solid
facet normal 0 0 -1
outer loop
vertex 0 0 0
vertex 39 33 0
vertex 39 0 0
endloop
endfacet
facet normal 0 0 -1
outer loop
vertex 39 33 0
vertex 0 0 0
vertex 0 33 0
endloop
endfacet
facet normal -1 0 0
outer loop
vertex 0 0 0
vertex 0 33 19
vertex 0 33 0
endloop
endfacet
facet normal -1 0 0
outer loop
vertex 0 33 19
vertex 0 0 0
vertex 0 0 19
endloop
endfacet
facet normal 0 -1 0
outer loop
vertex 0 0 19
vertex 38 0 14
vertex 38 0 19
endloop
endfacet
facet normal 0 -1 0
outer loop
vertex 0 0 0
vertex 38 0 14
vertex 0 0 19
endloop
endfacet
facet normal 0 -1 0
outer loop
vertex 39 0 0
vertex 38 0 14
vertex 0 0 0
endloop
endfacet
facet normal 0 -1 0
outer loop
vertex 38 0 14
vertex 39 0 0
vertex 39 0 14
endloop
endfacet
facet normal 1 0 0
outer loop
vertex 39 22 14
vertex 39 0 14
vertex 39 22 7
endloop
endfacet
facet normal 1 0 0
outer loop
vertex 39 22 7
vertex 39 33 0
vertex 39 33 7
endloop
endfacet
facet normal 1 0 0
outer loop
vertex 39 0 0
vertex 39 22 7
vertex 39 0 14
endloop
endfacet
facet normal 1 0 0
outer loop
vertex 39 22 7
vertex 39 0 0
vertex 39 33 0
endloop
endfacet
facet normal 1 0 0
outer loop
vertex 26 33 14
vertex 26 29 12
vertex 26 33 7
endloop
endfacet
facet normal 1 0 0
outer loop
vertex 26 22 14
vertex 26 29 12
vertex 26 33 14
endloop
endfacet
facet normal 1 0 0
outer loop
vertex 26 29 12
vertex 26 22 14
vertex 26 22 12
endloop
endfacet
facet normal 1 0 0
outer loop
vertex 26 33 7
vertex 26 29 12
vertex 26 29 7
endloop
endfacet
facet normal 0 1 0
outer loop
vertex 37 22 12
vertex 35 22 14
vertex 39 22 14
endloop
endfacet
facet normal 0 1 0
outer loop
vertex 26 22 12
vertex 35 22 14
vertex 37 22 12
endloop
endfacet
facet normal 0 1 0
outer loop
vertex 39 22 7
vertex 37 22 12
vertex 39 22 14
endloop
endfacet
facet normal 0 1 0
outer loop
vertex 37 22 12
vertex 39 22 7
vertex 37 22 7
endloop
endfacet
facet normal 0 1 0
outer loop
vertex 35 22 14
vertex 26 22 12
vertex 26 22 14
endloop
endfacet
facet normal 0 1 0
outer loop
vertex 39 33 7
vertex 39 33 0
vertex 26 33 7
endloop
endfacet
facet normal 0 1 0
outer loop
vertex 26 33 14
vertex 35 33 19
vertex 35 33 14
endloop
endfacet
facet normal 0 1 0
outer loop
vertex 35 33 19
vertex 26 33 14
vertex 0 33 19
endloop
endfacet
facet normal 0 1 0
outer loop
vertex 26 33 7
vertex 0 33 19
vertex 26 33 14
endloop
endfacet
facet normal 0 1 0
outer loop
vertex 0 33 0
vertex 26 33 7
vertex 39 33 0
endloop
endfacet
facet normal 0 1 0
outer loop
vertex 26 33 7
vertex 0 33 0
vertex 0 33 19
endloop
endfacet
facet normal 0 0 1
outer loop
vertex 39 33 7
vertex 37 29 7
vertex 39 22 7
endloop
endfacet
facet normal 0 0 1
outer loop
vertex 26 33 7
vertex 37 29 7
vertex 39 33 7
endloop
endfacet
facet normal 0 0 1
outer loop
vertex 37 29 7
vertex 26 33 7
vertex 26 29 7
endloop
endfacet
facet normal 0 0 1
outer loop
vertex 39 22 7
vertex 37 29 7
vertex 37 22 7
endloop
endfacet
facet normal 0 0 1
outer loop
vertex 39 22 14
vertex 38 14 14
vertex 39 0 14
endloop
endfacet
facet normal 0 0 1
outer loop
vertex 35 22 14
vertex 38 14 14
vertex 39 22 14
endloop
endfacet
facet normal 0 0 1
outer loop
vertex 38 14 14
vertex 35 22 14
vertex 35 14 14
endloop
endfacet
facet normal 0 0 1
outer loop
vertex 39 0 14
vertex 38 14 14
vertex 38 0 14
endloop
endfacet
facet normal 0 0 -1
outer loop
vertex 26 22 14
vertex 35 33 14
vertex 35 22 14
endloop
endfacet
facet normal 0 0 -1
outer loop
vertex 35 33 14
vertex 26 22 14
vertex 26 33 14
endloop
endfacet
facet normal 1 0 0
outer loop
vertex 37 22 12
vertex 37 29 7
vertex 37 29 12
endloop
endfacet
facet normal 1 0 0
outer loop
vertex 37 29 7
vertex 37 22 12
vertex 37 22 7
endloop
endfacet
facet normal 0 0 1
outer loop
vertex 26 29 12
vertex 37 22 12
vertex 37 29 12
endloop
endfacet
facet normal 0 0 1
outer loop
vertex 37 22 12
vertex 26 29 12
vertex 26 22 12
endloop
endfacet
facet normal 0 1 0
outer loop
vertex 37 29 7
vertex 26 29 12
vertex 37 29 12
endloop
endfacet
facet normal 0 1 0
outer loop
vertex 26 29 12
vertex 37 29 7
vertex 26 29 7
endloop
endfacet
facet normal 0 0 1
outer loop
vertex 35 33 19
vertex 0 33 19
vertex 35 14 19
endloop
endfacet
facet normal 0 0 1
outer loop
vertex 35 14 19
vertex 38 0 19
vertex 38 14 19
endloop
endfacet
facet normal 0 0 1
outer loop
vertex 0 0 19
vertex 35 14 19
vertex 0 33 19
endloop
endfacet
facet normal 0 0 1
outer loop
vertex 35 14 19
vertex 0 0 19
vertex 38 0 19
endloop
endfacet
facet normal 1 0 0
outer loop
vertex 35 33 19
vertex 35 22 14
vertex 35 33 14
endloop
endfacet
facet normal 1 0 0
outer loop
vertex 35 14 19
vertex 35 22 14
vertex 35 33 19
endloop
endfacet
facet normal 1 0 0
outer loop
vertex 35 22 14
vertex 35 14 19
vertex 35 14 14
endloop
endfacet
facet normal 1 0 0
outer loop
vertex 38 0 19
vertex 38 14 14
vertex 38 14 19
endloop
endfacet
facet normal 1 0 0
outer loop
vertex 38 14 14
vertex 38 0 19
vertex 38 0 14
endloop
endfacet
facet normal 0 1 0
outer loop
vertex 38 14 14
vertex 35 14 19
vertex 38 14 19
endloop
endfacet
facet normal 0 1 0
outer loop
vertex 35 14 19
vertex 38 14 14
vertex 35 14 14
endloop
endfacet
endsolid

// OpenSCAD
translate([6.5, 5.5, 3.5]) color([0.051152415727703016, 0.2730496953424699, 0.9956802504828091]) cube([13, 11, 7], center=true);
translate([19.5, 5.5, 3.5]) color([0.25391998649183944, 0.6803935586065328, 0.7027090324157298]) cube([13, 11, 7], center=true);
translate([32.5, 5.5, 3.5]) color([0.9291230685247301, 0.9949404722907454, 0.7620813713006523]) cube([13, 11, 7], center=true);
translate([6.5, 16.5, 3.5]) color([0.7625973189567923, 0.5162610213479427, 0.3860717563215982]) cube([13, 11, 7], center=true);
translate([19.5, 16.5, 3.5]) color([0.8343975914408754, 0.2506337702942619, 0.11599539642064438]) cube([13, 11, 7], center=true);
translate([32.5, 16.5, 3.5]) color([0.9817240858781537, 0.8047994372884794, 0.9431012043694105]) cube([13, 11, 7], center=true);
translate([6.5, 27.5, 3.5]) color([0.24264659424234813, 0.6738638931519124, 0.5327800265053269]) cube([13, 11, 7], center=true);
translate([19.5, 27.5, 3.5]) color([0.8756440829735669, 0.16255101499230828, 0.8680483691353614]) cube([13, 11, 7], center=true);
translate([32.5, 27.5, 3.5]) color([0.15305579700066485, 0.8462165202751376, 0.8200801239095041]) cube([13, 11, 7], center=true);
translate([6.5, 5.5, 10.5]) color([0.5849326984313064, 0.05125489506773162, 0.156166769208809]) cube([13, 11, 7], center=true);
translate([19.5, 5.5, 10.5]) color([0.34458118202681143, 0.291190613997825, 0.29342424365134856]) cube([13, 11, 7], center=true);
translate([32.5, 5.5, 10.5]) color([0.49485912757206985, 0.40365829021262367, 0.43100562682353716]) cube([13, 11, 7], center=true);
translate([6.5, 16.5, 10.5]) color([0.17003546655932655, 0.788340085303476, 0.5686027559906347]) cube([13, 11, 7], center=true);
translate([19.5, 16.5, 10.5]) color([0.44188886974638586, 0.3413461590512491, 0.009317740415098474]) cube([13, 11, 7], center=true);
translate([32.5, 16.5, 10.5]) color([0.72162474304745, 0.9099060293040379, 0.6642090292154819]) cube([13, 11, 7], center=true);
translate([6.5, 27.5, 10.5]) color([0.6628365798191557, 0.2575988974219705, 0.6122127561841502]) cube([13, 11, 7], center=true);
translate([19.5, 27.5, 10.5]) color([0.07024606726227145, 0.936077955543095, 0.27870721332570936]) cube([13, 11, 7], center=true);
translate([31.5, 25.5, 9.5]) color([0.8301443917589898, 0.5295296249528143, 0.06328696503387199]) cube([11, 7, 5], center=true);
translate([3.5, 5.5, 16.5]) color([0.639390097241117, 0.579686955437464, 0.9416538141960143]) cube([7, 11, 5], center=true);
translate([10.5, 5.5, 16.5]) color([0.6321291610349786, 0.5434228748459046, 0.38469874676133664]) cube([7, 11, 5], center=true);
translate([17.5, 5.5, 16.5]) color([0.434637548519362, 0.31139777068021024, 0.01363511702942577]) cube([7, 11, 5], center=true);
translate([24.5, 5.5, 16.5]) color([0.7785312160167684, 0.8197509625398982, 0.28044077713976767]) cube([7, 11, 5], center=true);
translate([3.5, 16.5, 16.5]) color([0.2581907625337724, 0.5272652548146236, 0.3179301097250754]) cube([7, 11, 5], center=true);
translate([10.5, 16.5, 16.5]) color([0.3422638341038545, 0.7055726929201963, 0.43169639849300545]) cube([7, 11, 5], center=true);
translate([17.5, 16.5, 16.5]) color([0.14170724037842175, 0.0059275683019511805, 0.5113413643489257]) cube([7, 11, 5], center=true);
translate([24.5, 16.5, 16.5]) color([0.7846494738841625, 0.7013909140505133, 0.7815279332048084]) cube([7, 11, 5], center=true);
translate([3.5, 27.5, 16.5]) color([0.38414456219182536, 0.4641305725985776, 0.036369164001931575]) cube([7, 11, 5], center=true);
translate([10.5, 27.5, 16.5]) color([0.9124290899309246, 0.6366653413633517, 0.798477007479407]) cube([7, 11, 5], center=true);
translate([17.5, 27.5, 16.5]) color([0.7602358551941967, 0.899814300356001, 0.3622224295816935]) cube([7, 11, 5], center=true);
translate([24.5, 27.5, 16.5]) color([0.9815510059994267, 0.15851660579635174, 0.19450942151924966]) cube([7, 11, 5], center=true);
translate([31.5, 1.5, 16.5]) color([0.35447317829590397, 0.700089123077614, 0.019141470871264166]) cube([7, 3, 5], center=true);
translate([31.5, 4.5, 16.5]) color([0.7352582011311831, 0.5715587801616956, 0.24207966979200135]) cube([7, 3, 5], center=true);
translate([31.5, 7.5, 16.5]) color([0.18514161515939986, 0.7580746928341441, 0.4199819570625165]) cube([7, 3, 5], center=true);
translate([31.5, 10.5, 16.5]) color([0.5731405723704375, 0.23673356878784502, 0.7138158488992904]) cube([7, 3, 5], center=true);
translate([31.5, 13.5, 16.5]) color([0.8637627475626694, 0.8949592620642776, 0.8103115760161889]) cube([7, 3, 5], center=true);
translate([31.5, 16.5, 16.5]) color([0.1004216369837837, 0.18827941391234093, 0.44049583318501173]) cube([7, 3, 5], center=true);
translate([31.5, 19.5, 16.5]) color([0.06522983258952386, 0.42674703623912436, 0.3947422574489625]) cube([7, 3, 5], center=true);
translate([31.5, 22.5, 16.5]) color([0.27185274848852736, 0.43721657158275895, 0.7577296702077931]) cube([7, 3, 5], center=true);
translate([31.5, 25.5, 16.5]) color([0.3561631337530091, 0.3277620307403001, 0.30701912216942273]) cube([7, 3, 5], center=true);
translate([31.5, 28.5, 16.5]) color([0.492518074892234, 0.7625268269371841, 0.2027877178963453]) cube([7, 3, 5], center=true);
translate([31.5, 31.5, 16.5]) color([0.39789846082497404, 0.4356119392473006, 0.6353731723550147]) cube([7, 3, 5], center=true);
translate([36.5, 1.0, 16.5]) color([0.673076446274384, 0.6970991483341651, 0.8225488218547198]) cube([3, 2, 5], center=true);
translate([36.5, 3.0, 16.5]) color([0.5826892216899469, 0.3545830833155835, 0.5687886411459258]) cube([3, 2, 5], center=true);
translate([36.5, 5.0, 16.5]) color([0.564415288794693, 0.2783497745403337, 0.8220051901362931]) cube([3, 2, 5], center=true);
translate([36.5, 7.0, 16.5]) color([0.39809270556066123, 0.9209203386432881, 0.13533998311747797]) cube([3, 2, 5], center=true);
translate([36.5, 9.0, 16.5]) color([0.08148203466772541, 0.8649487446802395, 0.36102136972914045]) cube([3, 2, 5], center=true);
translate([36.5, 11.0, 16.5]) color([0.06937329613248533, 0.7172877126247486, 0.671396341477498]) cube([3, 2, 5], center=true);
translate([36.5, 13.0, 16.5]) color([0.47110224547326685, 0.3145322421799046, 0.8413649413366762]) cube([3, 2, 5], center=true);
